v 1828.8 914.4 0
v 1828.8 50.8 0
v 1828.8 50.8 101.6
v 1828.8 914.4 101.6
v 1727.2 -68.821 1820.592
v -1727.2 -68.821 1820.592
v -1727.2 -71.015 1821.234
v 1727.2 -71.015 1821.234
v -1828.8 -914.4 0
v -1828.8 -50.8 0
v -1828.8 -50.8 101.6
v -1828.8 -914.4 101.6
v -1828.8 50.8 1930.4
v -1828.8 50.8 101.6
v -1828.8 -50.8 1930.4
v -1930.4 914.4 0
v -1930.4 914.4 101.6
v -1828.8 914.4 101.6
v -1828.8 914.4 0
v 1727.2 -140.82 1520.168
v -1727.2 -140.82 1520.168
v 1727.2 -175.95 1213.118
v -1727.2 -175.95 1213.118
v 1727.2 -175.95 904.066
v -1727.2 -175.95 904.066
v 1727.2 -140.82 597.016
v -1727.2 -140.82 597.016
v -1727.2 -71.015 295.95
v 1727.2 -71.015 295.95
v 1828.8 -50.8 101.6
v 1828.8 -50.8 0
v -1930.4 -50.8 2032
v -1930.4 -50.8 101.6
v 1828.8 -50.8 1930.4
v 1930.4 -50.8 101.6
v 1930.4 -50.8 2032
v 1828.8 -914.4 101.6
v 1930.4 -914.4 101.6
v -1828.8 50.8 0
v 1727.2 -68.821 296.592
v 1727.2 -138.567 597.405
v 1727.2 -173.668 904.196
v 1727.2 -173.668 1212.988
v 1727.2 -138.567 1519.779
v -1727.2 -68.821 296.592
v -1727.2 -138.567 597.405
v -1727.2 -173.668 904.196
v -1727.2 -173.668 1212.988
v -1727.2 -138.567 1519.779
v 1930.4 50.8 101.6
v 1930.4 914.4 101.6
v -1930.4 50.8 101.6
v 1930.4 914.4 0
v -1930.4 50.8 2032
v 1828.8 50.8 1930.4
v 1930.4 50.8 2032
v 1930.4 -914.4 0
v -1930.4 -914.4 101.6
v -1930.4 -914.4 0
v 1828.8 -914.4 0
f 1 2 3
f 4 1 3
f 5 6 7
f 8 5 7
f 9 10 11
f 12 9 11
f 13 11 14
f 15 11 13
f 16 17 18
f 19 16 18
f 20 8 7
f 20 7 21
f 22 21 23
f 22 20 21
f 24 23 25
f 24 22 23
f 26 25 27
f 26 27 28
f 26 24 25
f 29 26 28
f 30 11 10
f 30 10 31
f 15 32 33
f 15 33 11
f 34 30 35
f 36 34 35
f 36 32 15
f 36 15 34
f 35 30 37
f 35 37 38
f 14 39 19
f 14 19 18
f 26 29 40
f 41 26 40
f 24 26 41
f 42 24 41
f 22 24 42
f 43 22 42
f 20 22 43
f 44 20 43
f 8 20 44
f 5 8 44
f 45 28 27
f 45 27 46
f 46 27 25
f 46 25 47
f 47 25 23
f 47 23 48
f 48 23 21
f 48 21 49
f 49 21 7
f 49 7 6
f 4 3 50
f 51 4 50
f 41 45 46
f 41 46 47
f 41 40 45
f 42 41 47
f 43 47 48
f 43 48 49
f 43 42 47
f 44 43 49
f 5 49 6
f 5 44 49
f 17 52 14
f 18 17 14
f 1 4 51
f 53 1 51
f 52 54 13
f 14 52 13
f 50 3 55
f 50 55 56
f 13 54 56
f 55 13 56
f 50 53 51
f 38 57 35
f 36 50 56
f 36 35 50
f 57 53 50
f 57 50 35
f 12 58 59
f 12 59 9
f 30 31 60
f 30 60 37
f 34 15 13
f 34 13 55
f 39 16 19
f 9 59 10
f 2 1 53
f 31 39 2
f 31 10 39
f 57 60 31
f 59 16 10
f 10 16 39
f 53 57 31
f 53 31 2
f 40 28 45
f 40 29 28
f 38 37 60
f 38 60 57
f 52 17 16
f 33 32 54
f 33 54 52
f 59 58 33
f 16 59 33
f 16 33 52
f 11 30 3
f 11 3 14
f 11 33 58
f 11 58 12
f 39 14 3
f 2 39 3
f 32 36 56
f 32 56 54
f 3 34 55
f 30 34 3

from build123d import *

# Parameters (mm, degrees)
F1_DEPTH      = 50.8
F1_DEPTH_BACK = 50.8
F2_W          = 101.6
F2_H          = 101.6
F3_DEPTH      = 914.4
F3_DEPTH_BACK = 914.4
F5_DEPTH      = 1727.2
F5_DEPTH_BACK = 1727.2


with BuildPart() as f1:
    # F0 (on Front) → F1 (new body, two sides)
    with BuildSketch(Plane.XZ) as f1_sk:
        Polygon((-1930.4, 0), (0, 0), (0, 101.6), (-1828.8, 101.6), (-1828.8, 1930.4), (0, 1930.4), (0, 2032), (-1930.4, 2032), align=None)
        Polygon((0, 101.6), (0, 0), (1930.4, 0), (1930.4, 2032), (0, 2032), (0, 1930.4), (1828.8, 1930.4), (1828.8, 101.6), align=None)
    extrude(amount=F1_DEPTH)
    extrude(f1_sk.sketch, amount=-F1_DEPTH_BACK)

    # F2 (on Front) → F3 (join, two sides)
    with BuildSketch(Plane.XZ) as f3_sk:
        with Locations((1879.6, 50.8)):
            Rectangle(F2_W, F2_H)
        with Locations((-1879.6, 50.8)):
            Rectangle(F2_W, F2_H)
    extrude(amount=F3_DEPTH)
    extrude(f3_sk.sketch, amount=-F3_DEPTH_BACK)


with BuildPart() as f5:
    # F4 (on Right) → F5 (new body, two sides)
    with BuildSketch(Plane.YZ) as f5_sk:
        with BuildLine():
            ThreePointArc((-68.821303, 296.591962), (-178.066035, 1058.591962), (-68.821303, 1820.591962))
            Line((-68.821303, 1820.591962), (-71.015224, 1821.234229))
            ThreePointArc((-71.015224, 1821.234229), (-180.352035, 1058.591962), (-71.015224, 295.949694))
            Line((-71.015224, 295.949694), (-68.821303, 296.591962))
        make_face()
    extrude(amount=F5_DEPTH)
    extrude(f5_sk.sketch, amount=-F5_DEPTH_BACK)


solid = Compound([f1.part, f5.part])
